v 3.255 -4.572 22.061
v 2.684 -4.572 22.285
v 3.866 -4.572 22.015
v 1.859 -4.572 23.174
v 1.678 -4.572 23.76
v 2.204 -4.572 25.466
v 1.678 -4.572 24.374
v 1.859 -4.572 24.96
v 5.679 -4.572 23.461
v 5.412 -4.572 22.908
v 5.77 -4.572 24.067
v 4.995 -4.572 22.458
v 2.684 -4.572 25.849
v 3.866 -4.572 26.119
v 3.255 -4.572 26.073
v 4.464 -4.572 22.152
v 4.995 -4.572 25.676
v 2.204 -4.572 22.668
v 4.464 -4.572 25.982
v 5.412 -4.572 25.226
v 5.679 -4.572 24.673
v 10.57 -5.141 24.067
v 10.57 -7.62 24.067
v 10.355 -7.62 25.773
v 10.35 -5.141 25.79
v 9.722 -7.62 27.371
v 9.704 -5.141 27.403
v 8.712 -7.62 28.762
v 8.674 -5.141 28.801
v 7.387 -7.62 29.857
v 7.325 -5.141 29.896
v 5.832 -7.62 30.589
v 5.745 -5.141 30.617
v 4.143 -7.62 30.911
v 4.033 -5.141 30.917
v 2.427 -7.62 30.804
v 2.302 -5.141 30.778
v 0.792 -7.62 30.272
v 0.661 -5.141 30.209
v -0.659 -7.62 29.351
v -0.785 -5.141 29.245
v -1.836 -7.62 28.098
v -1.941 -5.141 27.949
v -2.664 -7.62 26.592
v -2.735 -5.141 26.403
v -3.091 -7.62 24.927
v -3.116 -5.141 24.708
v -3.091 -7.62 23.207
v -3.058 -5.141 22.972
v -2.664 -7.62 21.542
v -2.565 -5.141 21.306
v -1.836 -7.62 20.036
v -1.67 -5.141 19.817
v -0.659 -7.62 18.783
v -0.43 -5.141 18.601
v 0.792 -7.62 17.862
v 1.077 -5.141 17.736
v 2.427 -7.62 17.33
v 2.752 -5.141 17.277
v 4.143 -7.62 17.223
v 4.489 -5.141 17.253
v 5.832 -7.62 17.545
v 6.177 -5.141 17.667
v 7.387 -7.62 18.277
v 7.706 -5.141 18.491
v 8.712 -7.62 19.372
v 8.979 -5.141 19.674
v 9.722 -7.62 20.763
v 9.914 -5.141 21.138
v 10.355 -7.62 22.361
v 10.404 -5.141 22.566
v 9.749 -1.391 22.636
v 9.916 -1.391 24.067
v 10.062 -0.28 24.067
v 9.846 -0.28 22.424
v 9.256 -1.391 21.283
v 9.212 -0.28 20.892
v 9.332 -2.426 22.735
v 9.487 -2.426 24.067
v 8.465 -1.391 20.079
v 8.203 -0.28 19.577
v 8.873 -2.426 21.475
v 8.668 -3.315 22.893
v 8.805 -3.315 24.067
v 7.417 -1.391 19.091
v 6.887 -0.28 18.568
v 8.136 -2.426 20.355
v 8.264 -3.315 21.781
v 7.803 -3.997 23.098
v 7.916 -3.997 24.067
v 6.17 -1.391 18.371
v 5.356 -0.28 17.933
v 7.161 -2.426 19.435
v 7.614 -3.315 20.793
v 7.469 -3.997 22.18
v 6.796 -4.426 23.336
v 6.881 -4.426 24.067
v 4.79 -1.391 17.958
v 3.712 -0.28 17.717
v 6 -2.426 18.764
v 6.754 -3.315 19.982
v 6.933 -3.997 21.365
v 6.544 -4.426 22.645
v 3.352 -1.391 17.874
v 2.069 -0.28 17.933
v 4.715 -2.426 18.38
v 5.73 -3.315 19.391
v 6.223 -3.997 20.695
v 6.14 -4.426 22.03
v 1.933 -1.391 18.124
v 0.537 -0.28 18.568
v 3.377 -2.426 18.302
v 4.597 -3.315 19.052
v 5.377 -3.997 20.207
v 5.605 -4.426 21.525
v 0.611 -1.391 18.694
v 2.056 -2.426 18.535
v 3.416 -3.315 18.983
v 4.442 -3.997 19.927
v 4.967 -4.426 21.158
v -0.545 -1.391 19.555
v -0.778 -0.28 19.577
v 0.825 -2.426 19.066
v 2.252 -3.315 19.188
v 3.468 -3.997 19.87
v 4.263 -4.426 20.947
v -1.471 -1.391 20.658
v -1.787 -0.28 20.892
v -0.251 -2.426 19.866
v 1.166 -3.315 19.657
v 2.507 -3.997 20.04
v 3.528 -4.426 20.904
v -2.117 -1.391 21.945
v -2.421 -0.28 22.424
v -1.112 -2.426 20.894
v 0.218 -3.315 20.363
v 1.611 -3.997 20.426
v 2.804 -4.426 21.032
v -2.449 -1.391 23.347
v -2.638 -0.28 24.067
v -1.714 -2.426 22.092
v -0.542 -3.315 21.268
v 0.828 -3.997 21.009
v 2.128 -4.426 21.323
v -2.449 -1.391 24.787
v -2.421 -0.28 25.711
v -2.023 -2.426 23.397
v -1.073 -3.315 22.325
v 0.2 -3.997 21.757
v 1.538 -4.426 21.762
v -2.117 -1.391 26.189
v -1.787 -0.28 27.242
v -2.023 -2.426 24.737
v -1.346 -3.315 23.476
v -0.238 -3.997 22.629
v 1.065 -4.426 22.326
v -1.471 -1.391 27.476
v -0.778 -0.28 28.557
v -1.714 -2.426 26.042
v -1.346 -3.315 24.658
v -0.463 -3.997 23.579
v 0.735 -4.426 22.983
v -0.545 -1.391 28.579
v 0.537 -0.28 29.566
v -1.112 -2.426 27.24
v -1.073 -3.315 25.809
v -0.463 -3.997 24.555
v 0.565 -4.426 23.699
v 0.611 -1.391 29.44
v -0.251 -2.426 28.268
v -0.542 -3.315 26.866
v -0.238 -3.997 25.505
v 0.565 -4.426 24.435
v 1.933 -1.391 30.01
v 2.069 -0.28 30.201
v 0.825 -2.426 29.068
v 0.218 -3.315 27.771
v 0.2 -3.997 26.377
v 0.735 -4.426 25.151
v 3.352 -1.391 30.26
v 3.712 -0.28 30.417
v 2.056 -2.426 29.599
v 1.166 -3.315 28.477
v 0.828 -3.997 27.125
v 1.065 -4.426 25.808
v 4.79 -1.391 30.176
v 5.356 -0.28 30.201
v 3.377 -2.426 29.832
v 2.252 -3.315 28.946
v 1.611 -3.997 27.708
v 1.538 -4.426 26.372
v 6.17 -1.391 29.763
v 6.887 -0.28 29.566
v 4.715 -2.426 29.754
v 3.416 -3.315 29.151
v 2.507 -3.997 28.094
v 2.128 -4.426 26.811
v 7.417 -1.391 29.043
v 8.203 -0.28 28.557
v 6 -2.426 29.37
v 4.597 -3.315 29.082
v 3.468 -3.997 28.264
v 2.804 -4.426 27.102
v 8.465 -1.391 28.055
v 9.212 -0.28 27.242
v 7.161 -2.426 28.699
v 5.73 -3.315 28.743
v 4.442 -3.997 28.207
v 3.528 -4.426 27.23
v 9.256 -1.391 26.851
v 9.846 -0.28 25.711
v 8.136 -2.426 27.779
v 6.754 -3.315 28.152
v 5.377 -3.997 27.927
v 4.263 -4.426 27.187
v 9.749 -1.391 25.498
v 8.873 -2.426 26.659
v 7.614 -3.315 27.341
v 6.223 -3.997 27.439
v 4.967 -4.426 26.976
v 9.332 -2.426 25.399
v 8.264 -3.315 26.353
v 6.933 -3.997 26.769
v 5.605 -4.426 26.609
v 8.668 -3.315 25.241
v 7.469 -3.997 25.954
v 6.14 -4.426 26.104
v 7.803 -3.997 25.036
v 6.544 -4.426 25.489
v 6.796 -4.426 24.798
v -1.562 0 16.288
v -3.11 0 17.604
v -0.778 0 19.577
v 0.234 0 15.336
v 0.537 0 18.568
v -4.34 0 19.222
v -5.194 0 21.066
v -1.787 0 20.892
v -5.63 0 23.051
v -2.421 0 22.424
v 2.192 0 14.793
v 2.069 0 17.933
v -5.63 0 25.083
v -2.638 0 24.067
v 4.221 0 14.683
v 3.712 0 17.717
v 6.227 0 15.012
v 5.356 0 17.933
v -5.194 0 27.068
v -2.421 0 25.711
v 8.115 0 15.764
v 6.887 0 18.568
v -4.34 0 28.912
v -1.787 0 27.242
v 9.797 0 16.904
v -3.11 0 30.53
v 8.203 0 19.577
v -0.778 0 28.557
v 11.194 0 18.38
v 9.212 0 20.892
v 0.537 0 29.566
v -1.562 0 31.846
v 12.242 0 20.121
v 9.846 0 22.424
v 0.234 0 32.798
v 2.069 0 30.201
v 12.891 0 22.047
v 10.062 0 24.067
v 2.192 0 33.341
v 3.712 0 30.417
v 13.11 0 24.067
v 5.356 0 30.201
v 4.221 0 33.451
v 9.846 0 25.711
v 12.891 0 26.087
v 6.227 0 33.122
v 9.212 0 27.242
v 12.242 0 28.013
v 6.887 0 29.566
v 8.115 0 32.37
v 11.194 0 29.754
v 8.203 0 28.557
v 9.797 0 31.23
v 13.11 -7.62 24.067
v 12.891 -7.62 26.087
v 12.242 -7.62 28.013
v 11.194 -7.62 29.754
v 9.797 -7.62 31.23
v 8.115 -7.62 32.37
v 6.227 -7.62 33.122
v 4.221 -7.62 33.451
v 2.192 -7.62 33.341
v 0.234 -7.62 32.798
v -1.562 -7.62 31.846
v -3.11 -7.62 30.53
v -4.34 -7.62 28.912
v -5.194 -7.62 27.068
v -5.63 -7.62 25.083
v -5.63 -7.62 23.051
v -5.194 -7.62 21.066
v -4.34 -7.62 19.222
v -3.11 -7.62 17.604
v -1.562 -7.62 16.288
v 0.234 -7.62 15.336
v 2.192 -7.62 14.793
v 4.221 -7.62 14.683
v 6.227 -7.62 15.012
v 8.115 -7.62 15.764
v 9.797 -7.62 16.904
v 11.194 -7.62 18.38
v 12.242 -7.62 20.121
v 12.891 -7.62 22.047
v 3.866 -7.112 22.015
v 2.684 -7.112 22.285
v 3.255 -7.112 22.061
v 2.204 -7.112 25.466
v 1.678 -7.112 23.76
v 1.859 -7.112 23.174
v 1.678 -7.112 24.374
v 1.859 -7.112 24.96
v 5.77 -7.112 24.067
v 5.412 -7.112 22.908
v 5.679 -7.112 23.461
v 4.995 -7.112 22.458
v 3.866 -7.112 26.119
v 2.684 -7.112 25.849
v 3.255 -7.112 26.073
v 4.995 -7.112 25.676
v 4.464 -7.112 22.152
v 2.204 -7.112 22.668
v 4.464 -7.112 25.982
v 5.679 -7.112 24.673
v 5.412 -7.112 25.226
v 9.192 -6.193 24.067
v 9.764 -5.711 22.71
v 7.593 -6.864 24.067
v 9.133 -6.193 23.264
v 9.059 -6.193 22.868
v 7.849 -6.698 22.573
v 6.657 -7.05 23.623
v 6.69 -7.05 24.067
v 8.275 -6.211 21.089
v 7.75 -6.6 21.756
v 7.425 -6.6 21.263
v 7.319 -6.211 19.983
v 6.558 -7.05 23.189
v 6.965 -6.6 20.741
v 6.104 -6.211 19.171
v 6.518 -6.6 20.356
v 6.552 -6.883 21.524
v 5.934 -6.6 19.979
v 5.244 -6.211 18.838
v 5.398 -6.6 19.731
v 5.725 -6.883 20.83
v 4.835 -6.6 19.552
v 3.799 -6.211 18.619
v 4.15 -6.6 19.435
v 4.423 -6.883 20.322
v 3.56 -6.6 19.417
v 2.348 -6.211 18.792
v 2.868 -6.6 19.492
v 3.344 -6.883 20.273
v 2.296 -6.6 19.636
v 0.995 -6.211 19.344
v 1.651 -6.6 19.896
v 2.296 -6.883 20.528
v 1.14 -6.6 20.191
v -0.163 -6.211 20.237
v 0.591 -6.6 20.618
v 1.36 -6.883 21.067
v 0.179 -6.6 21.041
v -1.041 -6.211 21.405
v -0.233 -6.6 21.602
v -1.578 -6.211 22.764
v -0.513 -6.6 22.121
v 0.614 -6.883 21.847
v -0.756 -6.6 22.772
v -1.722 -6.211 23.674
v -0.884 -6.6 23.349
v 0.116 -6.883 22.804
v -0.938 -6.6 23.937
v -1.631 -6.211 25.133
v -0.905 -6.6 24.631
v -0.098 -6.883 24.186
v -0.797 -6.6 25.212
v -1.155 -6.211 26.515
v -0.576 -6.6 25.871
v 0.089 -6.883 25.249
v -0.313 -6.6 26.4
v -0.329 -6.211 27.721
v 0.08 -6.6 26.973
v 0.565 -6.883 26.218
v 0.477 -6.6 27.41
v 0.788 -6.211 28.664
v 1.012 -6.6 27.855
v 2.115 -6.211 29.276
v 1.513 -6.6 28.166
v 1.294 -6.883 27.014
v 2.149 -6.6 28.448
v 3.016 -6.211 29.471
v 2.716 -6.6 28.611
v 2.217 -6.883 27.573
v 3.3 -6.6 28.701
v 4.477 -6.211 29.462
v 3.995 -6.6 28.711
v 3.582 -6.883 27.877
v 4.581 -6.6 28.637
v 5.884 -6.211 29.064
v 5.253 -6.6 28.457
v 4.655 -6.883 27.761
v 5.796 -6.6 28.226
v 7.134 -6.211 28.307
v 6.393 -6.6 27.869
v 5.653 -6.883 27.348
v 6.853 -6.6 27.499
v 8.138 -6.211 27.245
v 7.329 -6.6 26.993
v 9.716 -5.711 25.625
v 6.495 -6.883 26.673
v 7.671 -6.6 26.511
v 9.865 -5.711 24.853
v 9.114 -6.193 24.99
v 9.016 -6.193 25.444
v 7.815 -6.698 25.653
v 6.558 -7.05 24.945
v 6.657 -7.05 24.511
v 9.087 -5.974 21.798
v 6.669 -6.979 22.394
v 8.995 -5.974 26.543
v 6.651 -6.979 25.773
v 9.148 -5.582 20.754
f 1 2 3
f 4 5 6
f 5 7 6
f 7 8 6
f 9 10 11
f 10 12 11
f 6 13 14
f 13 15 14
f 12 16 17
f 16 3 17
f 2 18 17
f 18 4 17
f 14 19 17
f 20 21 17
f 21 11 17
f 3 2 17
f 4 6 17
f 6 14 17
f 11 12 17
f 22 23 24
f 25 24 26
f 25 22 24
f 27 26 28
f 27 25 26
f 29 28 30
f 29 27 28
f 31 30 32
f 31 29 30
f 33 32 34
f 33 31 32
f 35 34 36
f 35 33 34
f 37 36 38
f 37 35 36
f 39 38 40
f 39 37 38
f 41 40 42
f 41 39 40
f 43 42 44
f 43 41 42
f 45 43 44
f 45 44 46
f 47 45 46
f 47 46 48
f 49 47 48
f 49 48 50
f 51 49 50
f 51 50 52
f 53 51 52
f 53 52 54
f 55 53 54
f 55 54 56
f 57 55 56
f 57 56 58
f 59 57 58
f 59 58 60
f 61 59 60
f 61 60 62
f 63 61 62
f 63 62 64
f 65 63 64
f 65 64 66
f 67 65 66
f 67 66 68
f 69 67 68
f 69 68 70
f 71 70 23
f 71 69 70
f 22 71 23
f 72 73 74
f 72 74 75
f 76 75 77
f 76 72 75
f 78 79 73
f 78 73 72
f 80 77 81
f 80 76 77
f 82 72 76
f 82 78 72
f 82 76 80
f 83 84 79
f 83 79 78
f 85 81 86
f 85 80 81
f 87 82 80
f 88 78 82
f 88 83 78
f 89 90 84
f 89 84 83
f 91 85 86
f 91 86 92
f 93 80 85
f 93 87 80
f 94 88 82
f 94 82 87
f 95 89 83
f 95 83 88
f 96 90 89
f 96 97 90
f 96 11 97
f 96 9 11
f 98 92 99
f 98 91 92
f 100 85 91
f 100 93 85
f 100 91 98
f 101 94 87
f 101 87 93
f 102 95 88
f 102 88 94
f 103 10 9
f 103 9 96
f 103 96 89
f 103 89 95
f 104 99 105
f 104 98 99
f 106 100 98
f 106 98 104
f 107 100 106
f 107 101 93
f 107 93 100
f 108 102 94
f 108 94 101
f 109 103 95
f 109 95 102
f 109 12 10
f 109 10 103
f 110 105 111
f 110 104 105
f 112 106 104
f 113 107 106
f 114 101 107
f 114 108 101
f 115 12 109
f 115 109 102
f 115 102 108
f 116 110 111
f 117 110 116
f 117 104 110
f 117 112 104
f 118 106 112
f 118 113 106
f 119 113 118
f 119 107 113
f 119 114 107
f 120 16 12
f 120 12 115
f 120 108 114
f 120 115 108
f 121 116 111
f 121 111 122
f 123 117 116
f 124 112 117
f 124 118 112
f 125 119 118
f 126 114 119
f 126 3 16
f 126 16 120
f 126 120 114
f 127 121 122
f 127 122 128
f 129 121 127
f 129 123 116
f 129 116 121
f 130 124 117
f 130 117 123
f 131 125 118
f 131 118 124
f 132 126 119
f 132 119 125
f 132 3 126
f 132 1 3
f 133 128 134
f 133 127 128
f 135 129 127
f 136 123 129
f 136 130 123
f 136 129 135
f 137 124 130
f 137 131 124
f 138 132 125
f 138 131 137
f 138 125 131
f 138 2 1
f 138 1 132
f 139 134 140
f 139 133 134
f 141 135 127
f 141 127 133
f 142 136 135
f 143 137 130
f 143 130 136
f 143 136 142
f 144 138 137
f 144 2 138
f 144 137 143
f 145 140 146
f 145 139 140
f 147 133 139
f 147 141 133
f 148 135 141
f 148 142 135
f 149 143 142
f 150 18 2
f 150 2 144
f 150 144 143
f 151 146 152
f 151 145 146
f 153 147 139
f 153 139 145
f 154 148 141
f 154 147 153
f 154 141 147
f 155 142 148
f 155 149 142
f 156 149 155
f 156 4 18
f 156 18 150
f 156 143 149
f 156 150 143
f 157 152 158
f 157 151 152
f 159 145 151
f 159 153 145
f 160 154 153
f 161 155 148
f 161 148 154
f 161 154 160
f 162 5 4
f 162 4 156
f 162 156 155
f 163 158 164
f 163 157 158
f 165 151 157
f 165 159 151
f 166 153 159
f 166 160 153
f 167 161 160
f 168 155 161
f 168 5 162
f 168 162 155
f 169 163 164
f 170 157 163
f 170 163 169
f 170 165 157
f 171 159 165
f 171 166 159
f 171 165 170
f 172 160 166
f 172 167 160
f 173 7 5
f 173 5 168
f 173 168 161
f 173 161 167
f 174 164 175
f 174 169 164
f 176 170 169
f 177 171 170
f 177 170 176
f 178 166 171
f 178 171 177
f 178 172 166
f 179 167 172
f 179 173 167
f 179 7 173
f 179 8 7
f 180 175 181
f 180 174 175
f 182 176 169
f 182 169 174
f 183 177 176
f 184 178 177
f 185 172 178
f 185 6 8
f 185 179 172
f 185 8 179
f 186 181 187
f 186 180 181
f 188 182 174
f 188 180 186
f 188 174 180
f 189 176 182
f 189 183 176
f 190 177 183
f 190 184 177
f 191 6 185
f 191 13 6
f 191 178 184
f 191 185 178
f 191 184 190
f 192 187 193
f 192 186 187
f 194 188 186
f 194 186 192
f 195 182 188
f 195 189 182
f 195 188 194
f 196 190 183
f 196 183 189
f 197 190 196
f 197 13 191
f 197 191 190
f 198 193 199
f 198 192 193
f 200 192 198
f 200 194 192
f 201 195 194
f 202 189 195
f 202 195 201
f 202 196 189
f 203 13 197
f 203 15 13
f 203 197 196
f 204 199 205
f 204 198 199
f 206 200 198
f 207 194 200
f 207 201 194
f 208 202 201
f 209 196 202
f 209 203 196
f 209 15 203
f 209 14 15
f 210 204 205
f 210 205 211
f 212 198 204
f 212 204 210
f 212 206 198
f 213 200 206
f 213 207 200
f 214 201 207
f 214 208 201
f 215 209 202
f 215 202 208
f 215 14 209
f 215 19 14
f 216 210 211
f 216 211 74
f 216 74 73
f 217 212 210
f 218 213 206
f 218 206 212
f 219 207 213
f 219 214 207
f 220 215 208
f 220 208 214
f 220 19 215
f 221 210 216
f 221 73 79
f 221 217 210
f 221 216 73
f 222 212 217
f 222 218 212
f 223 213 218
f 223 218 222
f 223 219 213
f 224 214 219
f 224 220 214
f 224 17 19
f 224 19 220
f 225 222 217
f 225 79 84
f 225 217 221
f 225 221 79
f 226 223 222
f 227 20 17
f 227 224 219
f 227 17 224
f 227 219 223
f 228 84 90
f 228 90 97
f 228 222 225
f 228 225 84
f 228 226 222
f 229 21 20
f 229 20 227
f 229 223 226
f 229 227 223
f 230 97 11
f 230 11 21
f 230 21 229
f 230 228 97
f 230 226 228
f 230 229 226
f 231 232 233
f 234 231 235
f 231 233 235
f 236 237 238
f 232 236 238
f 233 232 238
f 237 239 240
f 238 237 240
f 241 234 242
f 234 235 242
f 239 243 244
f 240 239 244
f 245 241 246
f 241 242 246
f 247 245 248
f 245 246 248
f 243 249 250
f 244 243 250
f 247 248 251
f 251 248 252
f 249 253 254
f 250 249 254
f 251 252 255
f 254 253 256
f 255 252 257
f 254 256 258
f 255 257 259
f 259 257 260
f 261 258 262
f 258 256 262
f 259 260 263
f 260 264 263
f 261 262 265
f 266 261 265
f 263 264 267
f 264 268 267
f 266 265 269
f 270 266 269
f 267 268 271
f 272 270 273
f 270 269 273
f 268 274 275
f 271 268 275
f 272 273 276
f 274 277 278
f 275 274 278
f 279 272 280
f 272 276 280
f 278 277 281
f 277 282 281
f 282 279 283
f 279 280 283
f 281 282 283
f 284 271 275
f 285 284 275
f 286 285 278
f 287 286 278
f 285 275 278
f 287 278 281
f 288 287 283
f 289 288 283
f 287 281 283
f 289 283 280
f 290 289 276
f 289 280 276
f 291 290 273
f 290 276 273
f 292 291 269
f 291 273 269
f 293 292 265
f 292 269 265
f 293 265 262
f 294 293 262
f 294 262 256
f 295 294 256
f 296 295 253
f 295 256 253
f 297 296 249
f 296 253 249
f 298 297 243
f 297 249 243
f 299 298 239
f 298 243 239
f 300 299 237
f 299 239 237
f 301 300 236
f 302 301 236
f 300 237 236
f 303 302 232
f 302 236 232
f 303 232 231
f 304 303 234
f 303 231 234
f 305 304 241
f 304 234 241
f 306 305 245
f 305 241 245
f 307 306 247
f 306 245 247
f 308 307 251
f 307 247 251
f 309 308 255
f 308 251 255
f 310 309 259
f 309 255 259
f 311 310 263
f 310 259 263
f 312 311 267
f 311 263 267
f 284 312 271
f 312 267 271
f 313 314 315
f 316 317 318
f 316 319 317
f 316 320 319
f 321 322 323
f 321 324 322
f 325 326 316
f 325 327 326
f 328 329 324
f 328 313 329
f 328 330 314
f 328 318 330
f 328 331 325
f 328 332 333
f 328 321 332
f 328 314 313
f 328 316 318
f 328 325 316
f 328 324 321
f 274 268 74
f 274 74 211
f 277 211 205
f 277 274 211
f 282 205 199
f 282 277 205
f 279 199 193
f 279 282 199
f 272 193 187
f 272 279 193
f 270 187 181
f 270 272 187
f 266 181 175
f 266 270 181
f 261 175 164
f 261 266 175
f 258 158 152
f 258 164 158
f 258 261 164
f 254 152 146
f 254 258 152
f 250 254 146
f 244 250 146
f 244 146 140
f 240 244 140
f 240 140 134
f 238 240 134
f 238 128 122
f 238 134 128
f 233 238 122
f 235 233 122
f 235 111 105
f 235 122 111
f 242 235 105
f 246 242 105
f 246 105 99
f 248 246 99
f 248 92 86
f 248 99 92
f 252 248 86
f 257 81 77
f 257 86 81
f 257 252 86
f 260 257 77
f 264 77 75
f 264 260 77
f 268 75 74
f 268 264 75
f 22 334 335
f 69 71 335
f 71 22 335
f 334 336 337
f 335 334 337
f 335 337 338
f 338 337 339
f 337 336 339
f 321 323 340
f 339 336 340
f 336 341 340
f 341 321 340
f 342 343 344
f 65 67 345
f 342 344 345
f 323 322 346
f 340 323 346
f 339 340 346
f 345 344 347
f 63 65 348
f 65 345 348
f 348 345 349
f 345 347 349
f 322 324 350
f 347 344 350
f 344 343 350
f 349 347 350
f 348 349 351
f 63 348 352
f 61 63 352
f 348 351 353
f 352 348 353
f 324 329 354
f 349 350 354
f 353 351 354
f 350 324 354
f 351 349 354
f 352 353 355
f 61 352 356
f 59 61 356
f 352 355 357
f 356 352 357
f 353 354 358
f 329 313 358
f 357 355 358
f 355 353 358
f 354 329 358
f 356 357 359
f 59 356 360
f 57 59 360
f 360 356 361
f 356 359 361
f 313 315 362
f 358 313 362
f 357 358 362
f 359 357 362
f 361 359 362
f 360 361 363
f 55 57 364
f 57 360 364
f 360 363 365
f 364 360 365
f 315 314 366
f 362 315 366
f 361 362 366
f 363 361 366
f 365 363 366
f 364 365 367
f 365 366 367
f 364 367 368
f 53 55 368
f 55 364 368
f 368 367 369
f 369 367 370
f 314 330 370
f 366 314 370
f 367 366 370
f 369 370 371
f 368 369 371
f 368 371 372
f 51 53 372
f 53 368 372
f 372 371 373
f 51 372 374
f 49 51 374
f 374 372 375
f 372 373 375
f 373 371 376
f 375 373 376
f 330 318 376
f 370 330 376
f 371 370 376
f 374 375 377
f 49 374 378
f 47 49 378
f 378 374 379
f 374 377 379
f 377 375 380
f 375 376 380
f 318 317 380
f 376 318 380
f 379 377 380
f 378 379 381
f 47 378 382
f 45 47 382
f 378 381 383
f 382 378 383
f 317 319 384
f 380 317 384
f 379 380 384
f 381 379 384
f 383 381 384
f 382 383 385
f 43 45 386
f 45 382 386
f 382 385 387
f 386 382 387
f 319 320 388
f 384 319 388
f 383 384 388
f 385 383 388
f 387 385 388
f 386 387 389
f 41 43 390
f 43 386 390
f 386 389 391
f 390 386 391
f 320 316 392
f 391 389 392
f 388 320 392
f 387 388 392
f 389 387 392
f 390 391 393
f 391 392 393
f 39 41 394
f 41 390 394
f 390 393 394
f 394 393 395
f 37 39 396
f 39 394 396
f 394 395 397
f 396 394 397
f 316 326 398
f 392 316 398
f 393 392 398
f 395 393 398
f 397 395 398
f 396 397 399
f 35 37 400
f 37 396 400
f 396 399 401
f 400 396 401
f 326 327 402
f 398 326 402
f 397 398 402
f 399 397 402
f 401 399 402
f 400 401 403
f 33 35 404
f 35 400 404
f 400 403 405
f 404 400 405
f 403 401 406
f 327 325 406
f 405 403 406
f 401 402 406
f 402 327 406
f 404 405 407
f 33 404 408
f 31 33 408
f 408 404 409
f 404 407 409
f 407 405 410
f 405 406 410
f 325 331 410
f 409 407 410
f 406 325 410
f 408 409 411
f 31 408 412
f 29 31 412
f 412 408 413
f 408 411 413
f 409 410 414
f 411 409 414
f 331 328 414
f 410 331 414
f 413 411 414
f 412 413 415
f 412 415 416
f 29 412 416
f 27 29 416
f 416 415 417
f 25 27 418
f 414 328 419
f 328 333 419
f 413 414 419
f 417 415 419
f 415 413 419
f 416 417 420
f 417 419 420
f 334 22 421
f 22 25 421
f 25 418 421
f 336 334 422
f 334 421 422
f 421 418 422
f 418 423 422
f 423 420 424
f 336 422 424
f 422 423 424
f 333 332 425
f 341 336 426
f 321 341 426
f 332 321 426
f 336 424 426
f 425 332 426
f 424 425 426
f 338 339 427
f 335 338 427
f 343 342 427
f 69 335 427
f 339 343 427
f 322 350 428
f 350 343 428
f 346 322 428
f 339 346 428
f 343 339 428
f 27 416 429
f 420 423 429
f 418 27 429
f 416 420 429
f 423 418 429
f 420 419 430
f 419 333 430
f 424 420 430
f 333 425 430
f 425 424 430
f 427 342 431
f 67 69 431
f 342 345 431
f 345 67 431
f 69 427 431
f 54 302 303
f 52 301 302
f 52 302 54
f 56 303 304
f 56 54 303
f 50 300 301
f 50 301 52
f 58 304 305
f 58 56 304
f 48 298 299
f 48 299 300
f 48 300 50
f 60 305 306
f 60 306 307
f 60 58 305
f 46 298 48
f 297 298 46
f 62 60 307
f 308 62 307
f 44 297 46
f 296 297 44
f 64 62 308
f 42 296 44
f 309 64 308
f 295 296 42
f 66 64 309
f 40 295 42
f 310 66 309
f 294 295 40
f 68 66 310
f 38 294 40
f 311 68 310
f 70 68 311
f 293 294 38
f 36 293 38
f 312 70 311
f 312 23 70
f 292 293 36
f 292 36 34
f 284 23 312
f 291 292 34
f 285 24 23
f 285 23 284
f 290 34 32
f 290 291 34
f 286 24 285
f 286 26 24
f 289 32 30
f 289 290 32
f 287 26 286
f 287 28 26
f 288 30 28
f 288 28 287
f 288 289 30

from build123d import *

# Parameters (mm, degrees)
F0_R     = 9.398
F1_DEPTH = 7.62
F2_T     = -3.048
F3_R     = 4.2924717139
F4_T     = -2.54


with BuildPart() as f1:
    # F0 (on Front) → F1 (new body)
    with BuildSketch(Plane.XZ):
        with Locations((3.7124650553, 24.0670088679)):
            Circle(F0_R)
    extrude(amount=F1_DEPTH)

    # F2
    f2_openings = [f1.faces().sort_by_distance(p)[0] for p in [
        (3.712465, 0, 24.067009),
    ]]
    offset(amount=F2_T, openings=f2_openings)

    # F3
    f3_edges = [f1.edges().sort_by_distance(p)[0] for p in [
        (-2.637535, -4.572, 24.067009),
    ]]
    fillet(f3_edges, radius=F3_R)

    # F4
    f4_openings = [f1.faces().sort_by_distance(p)[0] for p in [
        (3.712465, -7.62, 24.067009),
    ]]
    offset(amount=F4_T, openings=f4_openings)


solid = f1.part
